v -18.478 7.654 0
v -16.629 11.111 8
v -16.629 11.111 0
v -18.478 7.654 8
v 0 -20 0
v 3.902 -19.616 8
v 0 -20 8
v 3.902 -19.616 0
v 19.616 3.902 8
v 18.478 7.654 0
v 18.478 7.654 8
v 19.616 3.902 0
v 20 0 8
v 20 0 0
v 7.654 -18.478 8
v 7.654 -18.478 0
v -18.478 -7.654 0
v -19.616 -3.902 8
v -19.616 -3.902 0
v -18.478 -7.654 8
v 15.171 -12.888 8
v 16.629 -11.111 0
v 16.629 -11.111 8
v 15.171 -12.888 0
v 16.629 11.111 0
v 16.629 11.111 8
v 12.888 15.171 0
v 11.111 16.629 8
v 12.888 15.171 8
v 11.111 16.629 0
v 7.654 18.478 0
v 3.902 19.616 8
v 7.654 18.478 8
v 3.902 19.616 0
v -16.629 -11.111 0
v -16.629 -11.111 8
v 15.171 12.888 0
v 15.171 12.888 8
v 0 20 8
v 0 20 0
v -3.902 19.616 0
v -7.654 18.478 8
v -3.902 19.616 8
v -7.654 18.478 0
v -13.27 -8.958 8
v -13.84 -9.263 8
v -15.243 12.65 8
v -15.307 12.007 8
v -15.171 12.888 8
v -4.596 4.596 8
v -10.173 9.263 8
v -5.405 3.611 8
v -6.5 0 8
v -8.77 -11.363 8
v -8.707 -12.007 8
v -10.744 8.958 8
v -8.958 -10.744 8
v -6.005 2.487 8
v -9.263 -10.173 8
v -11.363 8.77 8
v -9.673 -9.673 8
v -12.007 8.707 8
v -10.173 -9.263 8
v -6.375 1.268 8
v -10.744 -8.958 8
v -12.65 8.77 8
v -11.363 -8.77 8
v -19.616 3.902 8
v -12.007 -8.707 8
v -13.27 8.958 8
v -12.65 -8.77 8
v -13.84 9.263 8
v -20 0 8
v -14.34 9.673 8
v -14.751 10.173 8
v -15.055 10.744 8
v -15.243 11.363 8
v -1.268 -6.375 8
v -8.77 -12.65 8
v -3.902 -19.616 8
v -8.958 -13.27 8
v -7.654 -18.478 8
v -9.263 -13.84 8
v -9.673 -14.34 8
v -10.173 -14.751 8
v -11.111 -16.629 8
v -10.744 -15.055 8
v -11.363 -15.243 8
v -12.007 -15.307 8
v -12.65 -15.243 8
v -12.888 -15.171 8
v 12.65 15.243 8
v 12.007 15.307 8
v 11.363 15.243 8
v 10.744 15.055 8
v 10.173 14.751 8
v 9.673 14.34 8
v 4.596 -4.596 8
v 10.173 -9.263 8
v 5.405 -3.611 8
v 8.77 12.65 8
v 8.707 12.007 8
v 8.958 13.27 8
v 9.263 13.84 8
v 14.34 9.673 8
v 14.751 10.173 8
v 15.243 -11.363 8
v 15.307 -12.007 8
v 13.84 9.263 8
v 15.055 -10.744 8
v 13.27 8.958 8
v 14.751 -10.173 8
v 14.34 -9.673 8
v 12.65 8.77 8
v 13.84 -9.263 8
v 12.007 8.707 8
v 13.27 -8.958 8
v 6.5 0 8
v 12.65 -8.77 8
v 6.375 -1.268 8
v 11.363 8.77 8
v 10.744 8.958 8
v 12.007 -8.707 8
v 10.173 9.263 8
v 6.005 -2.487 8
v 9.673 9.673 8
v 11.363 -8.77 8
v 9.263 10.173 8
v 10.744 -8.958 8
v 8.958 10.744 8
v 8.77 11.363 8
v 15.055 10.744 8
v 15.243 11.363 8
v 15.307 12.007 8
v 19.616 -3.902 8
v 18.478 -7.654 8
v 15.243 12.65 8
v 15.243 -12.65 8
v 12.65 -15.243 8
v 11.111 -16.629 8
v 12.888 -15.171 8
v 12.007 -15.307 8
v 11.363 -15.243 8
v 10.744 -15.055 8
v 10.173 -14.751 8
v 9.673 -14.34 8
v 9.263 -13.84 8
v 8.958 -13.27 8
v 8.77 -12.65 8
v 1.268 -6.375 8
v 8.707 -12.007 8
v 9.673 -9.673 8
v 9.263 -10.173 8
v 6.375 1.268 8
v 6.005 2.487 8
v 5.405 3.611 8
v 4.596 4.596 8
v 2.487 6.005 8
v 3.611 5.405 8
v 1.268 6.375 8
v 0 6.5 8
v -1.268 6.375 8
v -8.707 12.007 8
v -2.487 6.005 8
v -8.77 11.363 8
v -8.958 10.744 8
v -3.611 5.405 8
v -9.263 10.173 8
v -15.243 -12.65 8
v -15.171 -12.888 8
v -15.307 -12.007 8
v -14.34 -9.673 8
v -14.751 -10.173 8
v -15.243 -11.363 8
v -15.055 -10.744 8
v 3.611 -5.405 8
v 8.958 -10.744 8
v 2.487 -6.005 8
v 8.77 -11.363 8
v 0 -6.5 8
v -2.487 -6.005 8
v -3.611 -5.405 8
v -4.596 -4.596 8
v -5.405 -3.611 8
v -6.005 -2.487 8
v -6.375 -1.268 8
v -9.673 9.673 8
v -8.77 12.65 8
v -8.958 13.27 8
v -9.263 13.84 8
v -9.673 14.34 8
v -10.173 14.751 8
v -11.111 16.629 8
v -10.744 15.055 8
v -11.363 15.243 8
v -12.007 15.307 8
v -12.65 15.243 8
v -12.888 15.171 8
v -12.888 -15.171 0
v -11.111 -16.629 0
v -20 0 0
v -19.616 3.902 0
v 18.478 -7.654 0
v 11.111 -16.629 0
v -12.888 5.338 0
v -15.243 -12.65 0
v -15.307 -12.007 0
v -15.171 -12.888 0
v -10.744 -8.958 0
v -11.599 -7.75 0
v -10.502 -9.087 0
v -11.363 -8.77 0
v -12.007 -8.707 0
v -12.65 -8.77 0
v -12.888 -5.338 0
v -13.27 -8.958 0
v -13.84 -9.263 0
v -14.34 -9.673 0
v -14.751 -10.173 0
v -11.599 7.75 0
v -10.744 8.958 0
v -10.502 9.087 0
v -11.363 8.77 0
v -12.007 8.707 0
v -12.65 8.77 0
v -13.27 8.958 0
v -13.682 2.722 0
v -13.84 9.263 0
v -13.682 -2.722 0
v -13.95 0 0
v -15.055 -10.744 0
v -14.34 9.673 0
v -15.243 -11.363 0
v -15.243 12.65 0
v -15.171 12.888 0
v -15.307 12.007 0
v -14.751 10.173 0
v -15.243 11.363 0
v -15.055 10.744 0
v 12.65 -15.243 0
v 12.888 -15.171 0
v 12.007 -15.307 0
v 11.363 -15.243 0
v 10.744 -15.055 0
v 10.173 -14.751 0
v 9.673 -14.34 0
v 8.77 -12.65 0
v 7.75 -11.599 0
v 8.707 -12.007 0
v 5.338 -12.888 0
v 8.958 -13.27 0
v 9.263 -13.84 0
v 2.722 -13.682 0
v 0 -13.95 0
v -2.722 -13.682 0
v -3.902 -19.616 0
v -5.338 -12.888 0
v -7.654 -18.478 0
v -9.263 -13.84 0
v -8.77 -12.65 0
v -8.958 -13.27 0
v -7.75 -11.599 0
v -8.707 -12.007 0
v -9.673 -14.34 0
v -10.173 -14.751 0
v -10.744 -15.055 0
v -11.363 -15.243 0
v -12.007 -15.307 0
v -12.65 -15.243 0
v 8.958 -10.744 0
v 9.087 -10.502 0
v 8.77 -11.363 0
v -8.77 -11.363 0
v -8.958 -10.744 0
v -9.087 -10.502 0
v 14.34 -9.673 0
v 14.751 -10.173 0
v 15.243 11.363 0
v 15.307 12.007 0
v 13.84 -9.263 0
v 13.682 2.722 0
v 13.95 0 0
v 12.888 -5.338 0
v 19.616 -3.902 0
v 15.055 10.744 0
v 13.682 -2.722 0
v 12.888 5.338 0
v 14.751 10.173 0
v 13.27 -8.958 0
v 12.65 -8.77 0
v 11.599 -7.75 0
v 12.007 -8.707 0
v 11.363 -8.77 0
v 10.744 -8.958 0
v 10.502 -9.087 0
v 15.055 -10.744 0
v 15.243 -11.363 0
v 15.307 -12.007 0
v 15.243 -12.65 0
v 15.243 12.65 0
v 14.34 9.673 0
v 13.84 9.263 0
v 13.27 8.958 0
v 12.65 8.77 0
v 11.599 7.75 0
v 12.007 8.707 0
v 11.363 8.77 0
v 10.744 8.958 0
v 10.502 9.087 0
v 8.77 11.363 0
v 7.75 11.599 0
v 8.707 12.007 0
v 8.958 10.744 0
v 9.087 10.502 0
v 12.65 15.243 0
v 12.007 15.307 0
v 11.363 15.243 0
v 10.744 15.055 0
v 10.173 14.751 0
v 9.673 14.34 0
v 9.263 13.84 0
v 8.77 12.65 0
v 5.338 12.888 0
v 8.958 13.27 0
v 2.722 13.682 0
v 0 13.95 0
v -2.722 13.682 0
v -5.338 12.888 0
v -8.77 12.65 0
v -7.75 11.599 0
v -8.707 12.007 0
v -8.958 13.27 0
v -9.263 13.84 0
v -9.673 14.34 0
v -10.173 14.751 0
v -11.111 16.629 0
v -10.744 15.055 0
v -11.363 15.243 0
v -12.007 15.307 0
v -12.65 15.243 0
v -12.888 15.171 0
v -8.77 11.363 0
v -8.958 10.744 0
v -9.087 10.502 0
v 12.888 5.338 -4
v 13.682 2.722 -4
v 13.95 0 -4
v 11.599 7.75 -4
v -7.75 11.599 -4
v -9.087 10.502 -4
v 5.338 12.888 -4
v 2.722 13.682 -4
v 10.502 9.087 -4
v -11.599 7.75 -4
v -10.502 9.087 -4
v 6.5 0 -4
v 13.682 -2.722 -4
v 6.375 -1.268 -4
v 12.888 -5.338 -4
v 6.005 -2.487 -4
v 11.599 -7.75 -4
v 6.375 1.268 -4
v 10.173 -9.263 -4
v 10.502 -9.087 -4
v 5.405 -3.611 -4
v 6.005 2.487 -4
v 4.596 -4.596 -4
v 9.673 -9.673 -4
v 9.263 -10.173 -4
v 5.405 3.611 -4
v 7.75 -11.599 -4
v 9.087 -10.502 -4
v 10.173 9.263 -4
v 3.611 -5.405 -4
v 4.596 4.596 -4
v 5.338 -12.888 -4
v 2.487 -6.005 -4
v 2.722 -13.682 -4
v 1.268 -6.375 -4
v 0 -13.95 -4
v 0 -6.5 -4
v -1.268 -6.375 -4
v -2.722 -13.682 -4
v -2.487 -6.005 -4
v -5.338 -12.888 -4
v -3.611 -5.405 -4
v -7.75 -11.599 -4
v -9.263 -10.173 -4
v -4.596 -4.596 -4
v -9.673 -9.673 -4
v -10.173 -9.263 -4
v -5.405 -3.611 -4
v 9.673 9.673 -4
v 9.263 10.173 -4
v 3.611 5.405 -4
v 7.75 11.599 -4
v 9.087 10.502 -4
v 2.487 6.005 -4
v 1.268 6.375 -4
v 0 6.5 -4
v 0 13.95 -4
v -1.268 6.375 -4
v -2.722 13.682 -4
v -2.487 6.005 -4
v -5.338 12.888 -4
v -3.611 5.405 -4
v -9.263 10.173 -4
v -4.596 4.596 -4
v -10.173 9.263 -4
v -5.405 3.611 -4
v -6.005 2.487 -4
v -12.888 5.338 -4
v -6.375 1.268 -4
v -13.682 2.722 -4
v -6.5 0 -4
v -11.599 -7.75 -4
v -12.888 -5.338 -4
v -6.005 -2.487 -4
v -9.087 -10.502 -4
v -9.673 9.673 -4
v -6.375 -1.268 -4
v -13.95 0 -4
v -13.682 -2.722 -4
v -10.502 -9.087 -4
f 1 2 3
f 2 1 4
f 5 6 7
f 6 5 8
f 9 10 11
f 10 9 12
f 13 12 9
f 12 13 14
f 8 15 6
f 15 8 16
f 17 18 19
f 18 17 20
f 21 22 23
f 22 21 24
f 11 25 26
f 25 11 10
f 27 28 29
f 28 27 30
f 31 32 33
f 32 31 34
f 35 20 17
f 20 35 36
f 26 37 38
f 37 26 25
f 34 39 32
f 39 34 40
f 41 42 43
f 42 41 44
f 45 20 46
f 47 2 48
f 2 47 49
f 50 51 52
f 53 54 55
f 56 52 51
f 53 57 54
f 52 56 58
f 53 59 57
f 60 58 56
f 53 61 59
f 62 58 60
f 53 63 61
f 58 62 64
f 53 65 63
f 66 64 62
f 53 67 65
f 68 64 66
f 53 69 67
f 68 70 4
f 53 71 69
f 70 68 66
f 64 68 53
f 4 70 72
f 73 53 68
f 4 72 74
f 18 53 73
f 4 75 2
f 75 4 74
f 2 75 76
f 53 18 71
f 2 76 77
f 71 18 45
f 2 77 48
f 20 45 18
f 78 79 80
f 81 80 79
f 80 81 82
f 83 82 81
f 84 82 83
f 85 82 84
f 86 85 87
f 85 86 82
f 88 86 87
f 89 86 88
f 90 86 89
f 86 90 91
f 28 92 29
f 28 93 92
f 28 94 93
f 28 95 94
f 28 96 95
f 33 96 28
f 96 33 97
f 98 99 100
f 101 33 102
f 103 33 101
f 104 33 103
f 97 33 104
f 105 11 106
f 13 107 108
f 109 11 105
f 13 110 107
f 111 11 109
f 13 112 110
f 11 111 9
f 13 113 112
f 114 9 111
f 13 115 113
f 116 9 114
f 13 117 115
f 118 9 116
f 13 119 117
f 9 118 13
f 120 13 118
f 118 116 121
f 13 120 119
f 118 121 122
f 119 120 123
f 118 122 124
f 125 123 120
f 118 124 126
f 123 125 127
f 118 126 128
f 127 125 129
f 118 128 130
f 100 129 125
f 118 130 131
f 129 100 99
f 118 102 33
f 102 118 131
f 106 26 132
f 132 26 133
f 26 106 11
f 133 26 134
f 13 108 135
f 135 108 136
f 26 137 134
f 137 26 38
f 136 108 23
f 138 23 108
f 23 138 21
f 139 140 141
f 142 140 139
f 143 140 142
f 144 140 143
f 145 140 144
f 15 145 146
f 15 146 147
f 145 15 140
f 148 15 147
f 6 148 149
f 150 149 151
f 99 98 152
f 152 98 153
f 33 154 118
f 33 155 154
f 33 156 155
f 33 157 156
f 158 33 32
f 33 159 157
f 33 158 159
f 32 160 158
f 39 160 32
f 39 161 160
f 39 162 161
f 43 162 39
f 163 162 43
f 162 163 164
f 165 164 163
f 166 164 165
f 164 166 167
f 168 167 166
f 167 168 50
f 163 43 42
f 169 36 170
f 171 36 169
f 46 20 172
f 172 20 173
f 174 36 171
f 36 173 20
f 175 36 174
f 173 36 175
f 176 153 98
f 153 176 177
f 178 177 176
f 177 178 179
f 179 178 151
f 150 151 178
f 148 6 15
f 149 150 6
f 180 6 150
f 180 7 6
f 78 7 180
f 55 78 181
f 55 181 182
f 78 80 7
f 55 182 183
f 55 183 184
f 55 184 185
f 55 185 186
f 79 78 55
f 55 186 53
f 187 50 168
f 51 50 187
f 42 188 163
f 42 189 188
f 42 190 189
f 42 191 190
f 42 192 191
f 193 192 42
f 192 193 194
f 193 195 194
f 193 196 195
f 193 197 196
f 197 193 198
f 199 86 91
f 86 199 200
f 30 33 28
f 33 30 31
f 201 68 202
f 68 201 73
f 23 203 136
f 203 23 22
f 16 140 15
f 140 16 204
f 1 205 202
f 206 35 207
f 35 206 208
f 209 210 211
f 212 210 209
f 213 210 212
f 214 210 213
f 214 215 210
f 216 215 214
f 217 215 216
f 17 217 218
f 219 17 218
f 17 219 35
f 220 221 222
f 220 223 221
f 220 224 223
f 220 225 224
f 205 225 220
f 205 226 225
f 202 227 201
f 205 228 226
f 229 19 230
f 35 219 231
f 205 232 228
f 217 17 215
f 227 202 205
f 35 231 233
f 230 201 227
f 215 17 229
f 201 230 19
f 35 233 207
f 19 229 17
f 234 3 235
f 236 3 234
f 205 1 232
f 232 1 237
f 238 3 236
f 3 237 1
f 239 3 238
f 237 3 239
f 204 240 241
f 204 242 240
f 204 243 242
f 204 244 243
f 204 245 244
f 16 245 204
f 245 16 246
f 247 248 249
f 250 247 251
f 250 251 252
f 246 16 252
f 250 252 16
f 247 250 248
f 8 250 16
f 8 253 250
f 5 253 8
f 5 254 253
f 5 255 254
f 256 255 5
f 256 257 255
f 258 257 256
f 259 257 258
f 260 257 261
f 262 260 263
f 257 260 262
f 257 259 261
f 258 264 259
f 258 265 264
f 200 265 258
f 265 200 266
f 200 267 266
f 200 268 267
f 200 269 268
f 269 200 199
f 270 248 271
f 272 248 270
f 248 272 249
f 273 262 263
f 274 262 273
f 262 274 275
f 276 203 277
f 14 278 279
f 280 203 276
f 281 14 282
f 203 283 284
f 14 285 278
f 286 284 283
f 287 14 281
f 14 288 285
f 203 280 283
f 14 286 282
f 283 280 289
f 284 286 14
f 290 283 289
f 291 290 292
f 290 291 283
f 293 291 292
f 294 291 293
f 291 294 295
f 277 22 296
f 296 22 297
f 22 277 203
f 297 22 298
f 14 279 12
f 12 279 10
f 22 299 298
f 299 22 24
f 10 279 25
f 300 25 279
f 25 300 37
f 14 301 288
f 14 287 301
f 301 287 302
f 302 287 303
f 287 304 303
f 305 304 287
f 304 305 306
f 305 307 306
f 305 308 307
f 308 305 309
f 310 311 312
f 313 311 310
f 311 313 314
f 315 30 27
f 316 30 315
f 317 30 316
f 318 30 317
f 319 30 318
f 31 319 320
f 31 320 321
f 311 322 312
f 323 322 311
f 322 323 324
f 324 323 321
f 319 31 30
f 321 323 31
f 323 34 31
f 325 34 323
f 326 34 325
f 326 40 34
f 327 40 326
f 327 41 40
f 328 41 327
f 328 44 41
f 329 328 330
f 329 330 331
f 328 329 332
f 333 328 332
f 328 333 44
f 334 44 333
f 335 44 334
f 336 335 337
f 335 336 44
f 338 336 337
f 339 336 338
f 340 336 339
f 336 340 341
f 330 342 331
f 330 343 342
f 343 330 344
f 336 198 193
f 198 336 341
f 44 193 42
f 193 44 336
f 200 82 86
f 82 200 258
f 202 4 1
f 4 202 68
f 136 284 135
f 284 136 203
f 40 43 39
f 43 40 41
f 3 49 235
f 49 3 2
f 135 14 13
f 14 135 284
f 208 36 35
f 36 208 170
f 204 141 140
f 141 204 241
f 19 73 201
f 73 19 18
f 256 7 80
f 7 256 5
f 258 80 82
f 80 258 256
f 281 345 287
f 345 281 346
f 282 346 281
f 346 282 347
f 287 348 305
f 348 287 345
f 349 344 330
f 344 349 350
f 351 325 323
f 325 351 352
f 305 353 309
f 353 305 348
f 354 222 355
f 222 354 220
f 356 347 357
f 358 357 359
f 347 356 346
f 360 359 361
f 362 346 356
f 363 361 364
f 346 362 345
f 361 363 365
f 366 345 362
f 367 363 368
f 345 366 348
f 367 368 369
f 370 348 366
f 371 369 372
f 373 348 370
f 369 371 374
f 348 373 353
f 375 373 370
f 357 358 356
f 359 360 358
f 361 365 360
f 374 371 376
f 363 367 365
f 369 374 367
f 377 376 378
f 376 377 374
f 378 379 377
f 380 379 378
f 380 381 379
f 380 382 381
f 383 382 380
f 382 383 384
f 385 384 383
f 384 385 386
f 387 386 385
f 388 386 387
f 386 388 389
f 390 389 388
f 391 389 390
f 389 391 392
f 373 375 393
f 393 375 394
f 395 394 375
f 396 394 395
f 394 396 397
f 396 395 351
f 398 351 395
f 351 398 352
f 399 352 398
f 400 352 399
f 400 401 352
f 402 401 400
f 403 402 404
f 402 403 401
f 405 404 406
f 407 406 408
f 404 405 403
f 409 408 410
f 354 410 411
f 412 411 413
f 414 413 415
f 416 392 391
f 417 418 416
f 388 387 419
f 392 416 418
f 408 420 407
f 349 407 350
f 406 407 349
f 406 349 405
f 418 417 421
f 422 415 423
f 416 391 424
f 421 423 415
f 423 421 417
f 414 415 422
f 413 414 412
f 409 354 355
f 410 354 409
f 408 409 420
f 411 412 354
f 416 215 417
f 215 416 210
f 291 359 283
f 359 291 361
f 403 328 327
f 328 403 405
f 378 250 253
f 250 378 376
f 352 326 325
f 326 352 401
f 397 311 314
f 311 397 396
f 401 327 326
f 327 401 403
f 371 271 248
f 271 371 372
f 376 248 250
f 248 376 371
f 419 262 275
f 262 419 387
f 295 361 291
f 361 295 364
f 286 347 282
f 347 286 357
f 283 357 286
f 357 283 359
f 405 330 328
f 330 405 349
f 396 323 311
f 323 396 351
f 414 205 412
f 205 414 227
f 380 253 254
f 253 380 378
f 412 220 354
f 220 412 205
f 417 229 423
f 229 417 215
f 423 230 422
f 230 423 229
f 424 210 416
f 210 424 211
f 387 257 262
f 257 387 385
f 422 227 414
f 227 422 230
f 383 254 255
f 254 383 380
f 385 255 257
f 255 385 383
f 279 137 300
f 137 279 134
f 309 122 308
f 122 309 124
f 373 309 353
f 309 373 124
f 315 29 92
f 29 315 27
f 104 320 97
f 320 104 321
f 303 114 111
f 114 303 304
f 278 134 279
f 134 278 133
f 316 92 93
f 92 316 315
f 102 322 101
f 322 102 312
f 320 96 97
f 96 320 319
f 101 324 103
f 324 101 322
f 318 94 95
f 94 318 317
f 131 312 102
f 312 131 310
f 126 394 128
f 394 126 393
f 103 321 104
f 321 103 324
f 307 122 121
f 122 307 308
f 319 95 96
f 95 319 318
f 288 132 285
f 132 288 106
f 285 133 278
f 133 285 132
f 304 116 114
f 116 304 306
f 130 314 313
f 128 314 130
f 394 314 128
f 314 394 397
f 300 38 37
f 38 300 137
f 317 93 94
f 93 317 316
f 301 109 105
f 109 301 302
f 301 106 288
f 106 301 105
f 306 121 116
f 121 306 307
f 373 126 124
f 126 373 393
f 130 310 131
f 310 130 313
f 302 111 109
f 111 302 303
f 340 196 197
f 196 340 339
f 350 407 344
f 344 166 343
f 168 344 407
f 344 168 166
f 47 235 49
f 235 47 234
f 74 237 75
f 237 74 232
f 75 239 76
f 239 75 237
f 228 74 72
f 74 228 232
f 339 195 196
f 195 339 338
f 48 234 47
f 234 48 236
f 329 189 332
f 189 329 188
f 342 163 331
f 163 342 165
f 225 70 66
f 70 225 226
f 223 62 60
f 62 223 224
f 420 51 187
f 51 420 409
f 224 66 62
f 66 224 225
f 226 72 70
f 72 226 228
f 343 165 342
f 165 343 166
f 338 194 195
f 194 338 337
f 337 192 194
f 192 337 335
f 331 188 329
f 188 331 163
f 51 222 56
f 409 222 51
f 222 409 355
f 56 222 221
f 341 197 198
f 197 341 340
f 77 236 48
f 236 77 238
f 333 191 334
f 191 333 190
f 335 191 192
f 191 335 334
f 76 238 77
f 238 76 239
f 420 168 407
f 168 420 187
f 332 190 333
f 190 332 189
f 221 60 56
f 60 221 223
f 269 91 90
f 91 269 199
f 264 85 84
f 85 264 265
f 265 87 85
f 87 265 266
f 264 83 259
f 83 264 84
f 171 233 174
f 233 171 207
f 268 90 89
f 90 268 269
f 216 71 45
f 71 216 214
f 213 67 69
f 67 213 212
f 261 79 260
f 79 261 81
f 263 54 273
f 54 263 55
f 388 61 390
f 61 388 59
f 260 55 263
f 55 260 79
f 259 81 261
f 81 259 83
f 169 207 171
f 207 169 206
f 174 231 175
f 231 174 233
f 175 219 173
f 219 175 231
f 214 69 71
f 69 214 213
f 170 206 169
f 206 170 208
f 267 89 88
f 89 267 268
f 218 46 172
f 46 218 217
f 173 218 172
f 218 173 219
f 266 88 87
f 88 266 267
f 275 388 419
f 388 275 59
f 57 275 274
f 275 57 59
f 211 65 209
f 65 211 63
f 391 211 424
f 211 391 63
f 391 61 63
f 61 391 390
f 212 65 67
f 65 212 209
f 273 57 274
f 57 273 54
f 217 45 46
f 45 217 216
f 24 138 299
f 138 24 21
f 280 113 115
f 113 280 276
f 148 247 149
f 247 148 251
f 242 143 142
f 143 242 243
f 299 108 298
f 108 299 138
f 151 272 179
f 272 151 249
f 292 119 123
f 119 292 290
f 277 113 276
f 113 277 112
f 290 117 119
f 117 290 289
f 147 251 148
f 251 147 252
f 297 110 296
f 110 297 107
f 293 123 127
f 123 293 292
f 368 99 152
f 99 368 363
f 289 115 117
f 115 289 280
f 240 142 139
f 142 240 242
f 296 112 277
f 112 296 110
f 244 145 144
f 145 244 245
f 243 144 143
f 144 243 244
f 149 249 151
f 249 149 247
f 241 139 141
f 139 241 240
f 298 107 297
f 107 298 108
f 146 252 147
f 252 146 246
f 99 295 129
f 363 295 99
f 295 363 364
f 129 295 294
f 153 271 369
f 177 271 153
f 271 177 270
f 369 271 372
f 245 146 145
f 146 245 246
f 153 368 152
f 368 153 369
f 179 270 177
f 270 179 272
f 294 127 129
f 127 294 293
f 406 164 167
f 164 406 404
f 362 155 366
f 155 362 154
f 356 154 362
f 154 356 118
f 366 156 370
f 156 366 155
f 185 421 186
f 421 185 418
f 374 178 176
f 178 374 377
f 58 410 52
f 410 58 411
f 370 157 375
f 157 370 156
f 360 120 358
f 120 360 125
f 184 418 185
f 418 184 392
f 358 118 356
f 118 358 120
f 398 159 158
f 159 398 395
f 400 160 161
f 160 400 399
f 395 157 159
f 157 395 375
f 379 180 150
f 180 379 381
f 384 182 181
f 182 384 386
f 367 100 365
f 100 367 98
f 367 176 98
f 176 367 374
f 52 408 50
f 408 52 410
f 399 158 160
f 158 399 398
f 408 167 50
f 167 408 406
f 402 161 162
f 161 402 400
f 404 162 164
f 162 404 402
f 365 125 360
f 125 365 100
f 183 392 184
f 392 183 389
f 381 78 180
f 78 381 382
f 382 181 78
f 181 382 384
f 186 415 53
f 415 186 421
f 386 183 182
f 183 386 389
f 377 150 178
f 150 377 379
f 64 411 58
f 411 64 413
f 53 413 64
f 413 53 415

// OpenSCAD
$fn = 32;

// ----------------------------------------------------------------------
// Retaining cap: 6001 cover, 40 mm, spigot 27.9 mm
// ----------------------------------------------------------------------

// --- parameters (mm) ---
cap_d = 40;               // cover diameter
cap_t = 8;                // cover thickness
lip_d = 27.9;             // spigot that enters the housing
lip_h = 4;                // spigot height
shaft_d = 13;             // shaft opening
bolt_d = 6.6;             // bolt clearance
bolt_r = 16.98;           // bolt circle radius

module cover() {
  cylinder(h = cap_t, d = cap_d);
}

module spigot() {
  /* sunk 1 mm into the cover; the spigot sets the overall height */
  translate([0, 0, -lip_h]) cylinder(h = lip_h + 1, d = lip_d);
}

difference() {
  union() {
    cover();
    spigot();
  }
  for (i = [0 : 3]) rotate([0, 0, 45 + i * 90]) translate([bolt_r, 0, -lip_h - 1])
    cylinder(h = lip_h + cap_t + 2, d = bolt_d);
  translate([0, 0, -lip_h - 1]) cylinder(h = lip_h + cap_t + 2, d = shaft_d);
}
